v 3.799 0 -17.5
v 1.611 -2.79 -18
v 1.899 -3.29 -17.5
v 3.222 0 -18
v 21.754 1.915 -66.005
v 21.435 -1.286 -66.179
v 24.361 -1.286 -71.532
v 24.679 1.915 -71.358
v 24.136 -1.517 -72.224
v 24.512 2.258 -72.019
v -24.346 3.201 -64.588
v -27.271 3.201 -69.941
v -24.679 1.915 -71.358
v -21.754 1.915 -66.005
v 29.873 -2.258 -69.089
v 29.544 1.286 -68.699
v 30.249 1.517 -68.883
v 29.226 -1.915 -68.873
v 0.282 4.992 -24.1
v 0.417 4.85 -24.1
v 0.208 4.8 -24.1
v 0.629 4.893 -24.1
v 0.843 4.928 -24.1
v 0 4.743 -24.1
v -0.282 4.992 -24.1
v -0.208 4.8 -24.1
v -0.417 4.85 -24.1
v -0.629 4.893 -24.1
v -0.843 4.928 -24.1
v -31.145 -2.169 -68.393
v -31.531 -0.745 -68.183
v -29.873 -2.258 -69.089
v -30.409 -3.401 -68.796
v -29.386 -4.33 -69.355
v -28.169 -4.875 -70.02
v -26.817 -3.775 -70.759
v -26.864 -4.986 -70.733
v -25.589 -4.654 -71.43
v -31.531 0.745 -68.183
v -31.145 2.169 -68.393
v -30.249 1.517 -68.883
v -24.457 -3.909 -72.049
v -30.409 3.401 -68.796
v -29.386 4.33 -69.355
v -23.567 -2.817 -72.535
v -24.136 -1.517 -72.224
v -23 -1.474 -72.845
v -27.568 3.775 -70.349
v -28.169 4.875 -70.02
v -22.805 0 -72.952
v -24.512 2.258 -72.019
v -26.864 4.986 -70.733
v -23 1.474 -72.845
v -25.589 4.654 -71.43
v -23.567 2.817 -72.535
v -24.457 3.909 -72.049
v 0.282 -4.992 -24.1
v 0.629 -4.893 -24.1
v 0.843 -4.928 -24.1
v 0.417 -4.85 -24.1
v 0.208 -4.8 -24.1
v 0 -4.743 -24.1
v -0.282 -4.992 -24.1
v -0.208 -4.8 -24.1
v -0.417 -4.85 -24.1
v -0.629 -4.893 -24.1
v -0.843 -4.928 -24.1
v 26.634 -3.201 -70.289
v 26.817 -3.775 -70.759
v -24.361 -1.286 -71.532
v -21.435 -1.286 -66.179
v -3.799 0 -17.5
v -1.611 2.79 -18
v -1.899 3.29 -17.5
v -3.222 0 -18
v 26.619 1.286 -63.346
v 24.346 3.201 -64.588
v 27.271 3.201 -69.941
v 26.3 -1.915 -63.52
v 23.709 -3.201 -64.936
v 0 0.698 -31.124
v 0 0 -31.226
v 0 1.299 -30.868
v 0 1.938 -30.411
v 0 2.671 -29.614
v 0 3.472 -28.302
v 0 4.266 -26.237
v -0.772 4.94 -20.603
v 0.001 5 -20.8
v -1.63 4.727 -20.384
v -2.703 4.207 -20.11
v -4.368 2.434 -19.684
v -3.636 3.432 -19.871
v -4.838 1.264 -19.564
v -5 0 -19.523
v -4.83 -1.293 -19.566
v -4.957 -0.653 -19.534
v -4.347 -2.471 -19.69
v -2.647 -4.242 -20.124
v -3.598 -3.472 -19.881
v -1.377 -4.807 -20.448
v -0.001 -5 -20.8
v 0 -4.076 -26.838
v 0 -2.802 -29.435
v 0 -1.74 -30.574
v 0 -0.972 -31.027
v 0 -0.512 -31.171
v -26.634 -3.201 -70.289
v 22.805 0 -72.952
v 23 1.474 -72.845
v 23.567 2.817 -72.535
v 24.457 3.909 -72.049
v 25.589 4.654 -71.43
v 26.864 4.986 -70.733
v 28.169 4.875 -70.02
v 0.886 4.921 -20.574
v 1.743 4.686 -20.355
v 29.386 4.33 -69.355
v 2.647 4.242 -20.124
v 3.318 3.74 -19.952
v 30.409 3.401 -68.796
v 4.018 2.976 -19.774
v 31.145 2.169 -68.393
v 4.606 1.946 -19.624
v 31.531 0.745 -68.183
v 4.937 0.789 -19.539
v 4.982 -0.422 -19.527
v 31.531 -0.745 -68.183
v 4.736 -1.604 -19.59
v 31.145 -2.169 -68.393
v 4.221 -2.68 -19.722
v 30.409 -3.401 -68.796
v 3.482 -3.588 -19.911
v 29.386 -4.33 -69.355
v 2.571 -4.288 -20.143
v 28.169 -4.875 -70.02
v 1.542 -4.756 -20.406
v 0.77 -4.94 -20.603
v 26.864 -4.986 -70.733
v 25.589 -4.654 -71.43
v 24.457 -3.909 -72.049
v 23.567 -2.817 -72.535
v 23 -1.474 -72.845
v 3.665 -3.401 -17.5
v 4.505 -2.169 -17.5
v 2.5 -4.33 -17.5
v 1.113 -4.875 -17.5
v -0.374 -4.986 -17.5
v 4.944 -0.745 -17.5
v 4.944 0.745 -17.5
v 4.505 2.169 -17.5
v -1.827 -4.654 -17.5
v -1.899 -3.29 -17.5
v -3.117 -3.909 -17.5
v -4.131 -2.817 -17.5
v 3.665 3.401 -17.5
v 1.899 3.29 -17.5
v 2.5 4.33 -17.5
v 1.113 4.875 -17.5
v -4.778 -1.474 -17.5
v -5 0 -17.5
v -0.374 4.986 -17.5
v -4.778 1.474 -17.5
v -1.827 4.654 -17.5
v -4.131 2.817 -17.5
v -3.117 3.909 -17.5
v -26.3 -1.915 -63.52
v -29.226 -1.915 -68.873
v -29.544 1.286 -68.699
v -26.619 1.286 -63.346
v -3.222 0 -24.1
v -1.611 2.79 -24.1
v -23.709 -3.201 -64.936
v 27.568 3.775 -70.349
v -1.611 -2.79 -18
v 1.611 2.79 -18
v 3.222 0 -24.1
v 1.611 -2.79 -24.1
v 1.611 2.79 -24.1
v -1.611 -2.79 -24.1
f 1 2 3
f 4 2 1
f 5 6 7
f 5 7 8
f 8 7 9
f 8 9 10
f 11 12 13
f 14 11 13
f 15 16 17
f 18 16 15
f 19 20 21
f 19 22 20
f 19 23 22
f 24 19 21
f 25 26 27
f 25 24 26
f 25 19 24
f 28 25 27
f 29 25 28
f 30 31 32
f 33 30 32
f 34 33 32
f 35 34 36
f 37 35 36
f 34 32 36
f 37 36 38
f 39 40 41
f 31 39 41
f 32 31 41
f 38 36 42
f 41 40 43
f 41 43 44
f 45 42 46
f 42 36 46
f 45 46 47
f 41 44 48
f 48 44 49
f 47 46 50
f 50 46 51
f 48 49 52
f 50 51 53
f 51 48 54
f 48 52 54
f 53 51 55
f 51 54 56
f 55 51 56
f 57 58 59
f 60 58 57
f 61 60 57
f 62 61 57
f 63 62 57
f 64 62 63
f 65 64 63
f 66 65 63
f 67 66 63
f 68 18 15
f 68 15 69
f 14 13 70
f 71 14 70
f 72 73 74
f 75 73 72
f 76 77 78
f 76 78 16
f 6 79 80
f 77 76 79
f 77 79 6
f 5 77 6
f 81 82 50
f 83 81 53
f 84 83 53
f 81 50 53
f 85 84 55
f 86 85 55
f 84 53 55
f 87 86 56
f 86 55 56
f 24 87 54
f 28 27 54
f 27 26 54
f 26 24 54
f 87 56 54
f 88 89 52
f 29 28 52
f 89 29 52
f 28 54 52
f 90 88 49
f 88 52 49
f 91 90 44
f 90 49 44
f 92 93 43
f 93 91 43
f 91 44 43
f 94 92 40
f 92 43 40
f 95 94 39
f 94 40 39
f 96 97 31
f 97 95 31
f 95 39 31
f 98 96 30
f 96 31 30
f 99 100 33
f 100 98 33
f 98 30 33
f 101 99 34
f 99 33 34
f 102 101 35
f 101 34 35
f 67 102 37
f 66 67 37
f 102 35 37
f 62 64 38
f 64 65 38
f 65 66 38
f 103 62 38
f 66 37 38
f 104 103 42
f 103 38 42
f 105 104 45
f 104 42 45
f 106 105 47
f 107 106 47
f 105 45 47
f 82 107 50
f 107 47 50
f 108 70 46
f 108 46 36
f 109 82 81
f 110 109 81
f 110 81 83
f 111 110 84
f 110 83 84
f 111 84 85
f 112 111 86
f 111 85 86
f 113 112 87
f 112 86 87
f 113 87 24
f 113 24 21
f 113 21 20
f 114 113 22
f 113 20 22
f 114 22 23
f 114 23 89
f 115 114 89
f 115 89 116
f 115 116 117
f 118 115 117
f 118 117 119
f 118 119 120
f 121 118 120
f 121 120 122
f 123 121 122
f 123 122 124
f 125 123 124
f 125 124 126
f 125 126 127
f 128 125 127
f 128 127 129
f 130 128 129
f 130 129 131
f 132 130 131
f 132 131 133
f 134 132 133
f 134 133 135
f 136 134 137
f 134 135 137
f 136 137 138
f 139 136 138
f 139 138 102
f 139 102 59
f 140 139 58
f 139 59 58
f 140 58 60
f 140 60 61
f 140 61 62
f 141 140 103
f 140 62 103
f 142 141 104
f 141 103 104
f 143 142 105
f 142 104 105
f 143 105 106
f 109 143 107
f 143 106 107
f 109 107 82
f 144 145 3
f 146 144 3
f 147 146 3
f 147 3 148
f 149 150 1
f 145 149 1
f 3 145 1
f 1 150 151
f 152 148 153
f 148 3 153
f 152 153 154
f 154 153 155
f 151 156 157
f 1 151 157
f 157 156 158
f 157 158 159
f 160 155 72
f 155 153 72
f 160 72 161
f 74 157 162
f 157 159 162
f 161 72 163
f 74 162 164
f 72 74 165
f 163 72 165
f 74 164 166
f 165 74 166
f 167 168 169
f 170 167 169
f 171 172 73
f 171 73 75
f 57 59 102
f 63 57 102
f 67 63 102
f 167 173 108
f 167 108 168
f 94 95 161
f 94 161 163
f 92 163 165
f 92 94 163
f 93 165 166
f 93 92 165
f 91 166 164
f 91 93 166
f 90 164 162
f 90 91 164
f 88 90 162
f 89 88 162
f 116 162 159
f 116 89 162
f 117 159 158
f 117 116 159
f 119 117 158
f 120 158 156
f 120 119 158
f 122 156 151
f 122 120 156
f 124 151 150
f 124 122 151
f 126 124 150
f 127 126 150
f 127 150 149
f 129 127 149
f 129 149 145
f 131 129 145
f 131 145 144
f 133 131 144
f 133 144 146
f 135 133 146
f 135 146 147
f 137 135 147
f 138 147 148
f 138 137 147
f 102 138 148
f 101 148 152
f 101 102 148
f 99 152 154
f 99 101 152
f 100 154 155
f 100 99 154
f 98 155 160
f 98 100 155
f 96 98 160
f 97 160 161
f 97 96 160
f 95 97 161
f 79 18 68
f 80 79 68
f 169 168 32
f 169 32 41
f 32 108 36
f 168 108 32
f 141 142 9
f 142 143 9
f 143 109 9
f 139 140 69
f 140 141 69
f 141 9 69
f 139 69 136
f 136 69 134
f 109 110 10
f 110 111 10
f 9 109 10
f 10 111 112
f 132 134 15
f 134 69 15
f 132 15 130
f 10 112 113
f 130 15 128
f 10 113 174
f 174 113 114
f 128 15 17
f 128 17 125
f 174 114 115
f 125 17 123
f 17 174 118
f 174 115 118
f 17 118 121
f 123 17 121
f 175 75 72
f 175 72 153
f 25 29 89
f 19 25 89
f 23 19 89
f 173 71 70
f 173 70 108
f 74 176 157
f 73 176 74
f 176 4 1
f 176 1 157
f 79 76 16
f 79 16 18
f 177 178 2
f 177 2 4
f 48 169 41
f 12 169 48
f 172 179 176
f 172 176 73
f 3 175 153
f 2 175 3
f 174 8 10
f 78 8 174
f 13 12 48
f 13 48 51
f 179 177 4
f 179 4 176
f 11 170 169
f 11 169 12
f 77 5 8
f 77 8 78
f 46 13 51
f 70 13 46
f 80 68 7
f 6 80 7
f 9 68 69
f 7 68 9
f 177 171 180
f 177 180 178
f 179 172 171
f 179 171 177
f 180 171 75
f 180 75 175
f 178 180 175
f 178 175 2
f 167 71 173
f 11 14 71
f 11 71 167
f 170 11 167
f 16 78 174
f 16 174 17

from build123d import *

# Parameters (mm, degrees)
SKETCH1_W          = 5
SKETCH1_H          = 6.6
CUT_EXTRUDE1_DEPTH = 6.6
CUT_EXTRUDE2_DEPTH = 6.6
CUT_EXTRUDE3_DEPTH = 6.6
CHAMFER1_SIZE      = 0.5


with BuildPart() as part:
    # Sketch1 → Revolve-Thin1 (revolve)
    with BuildSketch(Plane(origin=(0, 0, 0), x_dir=(1, 0, 0), z_dir=(0, 1, 0))):
        with Locations((-2.5, 20.8)):
            Rectangle(SKETCH1_W, SKETCH1_H)
    revolve(axis=Axis((0, 0, 0), (0, 0, -1)))

    # Sketch3 → Revolve-Thin2 (revolve)
    with BuildSketch(Plane(origin=(0, 0, 0), x_dir=(1, 0, 0), z_dir=(0, 1, 0))):
        Polygon((-27.192355447, 70.553826822), (0, 20.8), (4.387478051, 23.197923342), (-22.804877396, 72.951750164), align=None)
    revolve(axis=Axis((-27.192355447, 0, -70.553826822), (0.479584668, 0, 0.87749561)))

    # Sketch4 → Revolve-Thin3 (revolve)
    with BuildSketch(Plane(origin=(0, 0, 0), x_dir=(1, 0, 0), z_dir=(0, 1, 0))):
        Polygon((0, 20.8), (27.192355447, 70.553826822), (22.804877396, 72.951750164), (-4.387478051, 23.197923342), align=None)
    revolve(axis=Axis((0, 0, -20.8), (0.479584668, 0, -0.87749561)))

    # Sketch5 → Cut-Extrude1 (cut)
    with BuildSketch(Plane(origin=(-35.945691024, 0, -65.769796576), x_dir=(-0.87749561, 0, 0.479584668), z_dir=(-0.479584668, 0, -0.87749561))):
        Polygon((-7.021637489, 1.286202481), (-9.612383318, 3.201100925), (-12.566106931, 1.914898444), (-12.929084714, -1.286202481), (-10.338338885, -3.201100925), (-7.384615273, -1.914898444), align=None)
    extrude(amount=-CUT_EXTRUDE1_DEPTH, mode=Mode.SUBTRACT)

    # Sketch6 → Cut-Extrude2 (cut)
    with BuildSketch(Plane.XY.offset(-17.5)):
        Polygon((1.610807251, 2.79), (-1.610807251, 2.79), (-3.221614502, 0), (-1.610807251, -2.79), (1.610807251, -2.79), (3.221614502, 0), align=None)
    extrude(amount=-CUT_EXTRUDE2_DEPTH, mode=Mode.SUBTRACT)

    # Sketch7 → Cut-Extrude3 (cut)
    with BuildSketch(Plane(origin=(35.945691024, 0, -65.769796576), x_dir=(-0.87749561, 0, -0.479584668), z_dir=(0.479584668, 0, -0.87749561))):
        Polygon((9.612383318, 3.201100925), (7.021637489, 1.286202481), (7.384615273, -1.914898444), (10.338338885, -3.201100925), (12.929084714, -1.286202481), (12.566106931, 1.914898444), align=None)
    extrude(amount=-CUT_EXTRUDE3_DEPTH, mode=Mode.SUBTRACT)

    # Chamfer1
    chamfer1_edges = [part.edges().sort_by_distance(p)[0] for p in [
        (-29.624979245, -0.314347981, -69.224305553),
        (-28.647550905, 2.243651703, -69.758507252),
        (-26.214927107, 2.557999684, -71.088028522),
        (-24.75973165, 0.314347981, -71.883348091),
        (-25.73715999, -2.243651703, -71.349146391),
        (-28.169783788, -2.557999684, -70.019625122),
        (2.416210877, 1.395, -17.5),
        (0, 2.79, -17.5),
        (-2.416210877, 1.395, -17.5),
        (-2.416210877, -1.395, -17.5),
        (0, -2.79, -17.5),
        (2.416210877, -1.395, -17.5),
        (26.214927107, 2.557999684, -71.088028522),
        (28.647550905, 2.243651703, -69.758507252),
        (29.624979245, -0.314347981, -69.224305553),
        (28.169783788, -2.557999684, -70.019625122),
        (25.73715999, -2.243651703, -71.349146391),
        (24.75973165, 0.314347981, -71.883348091),
    ]]
    chamfer(chamfer1_edges, length=CHAMFER1_SIZE)


solid = part.part
